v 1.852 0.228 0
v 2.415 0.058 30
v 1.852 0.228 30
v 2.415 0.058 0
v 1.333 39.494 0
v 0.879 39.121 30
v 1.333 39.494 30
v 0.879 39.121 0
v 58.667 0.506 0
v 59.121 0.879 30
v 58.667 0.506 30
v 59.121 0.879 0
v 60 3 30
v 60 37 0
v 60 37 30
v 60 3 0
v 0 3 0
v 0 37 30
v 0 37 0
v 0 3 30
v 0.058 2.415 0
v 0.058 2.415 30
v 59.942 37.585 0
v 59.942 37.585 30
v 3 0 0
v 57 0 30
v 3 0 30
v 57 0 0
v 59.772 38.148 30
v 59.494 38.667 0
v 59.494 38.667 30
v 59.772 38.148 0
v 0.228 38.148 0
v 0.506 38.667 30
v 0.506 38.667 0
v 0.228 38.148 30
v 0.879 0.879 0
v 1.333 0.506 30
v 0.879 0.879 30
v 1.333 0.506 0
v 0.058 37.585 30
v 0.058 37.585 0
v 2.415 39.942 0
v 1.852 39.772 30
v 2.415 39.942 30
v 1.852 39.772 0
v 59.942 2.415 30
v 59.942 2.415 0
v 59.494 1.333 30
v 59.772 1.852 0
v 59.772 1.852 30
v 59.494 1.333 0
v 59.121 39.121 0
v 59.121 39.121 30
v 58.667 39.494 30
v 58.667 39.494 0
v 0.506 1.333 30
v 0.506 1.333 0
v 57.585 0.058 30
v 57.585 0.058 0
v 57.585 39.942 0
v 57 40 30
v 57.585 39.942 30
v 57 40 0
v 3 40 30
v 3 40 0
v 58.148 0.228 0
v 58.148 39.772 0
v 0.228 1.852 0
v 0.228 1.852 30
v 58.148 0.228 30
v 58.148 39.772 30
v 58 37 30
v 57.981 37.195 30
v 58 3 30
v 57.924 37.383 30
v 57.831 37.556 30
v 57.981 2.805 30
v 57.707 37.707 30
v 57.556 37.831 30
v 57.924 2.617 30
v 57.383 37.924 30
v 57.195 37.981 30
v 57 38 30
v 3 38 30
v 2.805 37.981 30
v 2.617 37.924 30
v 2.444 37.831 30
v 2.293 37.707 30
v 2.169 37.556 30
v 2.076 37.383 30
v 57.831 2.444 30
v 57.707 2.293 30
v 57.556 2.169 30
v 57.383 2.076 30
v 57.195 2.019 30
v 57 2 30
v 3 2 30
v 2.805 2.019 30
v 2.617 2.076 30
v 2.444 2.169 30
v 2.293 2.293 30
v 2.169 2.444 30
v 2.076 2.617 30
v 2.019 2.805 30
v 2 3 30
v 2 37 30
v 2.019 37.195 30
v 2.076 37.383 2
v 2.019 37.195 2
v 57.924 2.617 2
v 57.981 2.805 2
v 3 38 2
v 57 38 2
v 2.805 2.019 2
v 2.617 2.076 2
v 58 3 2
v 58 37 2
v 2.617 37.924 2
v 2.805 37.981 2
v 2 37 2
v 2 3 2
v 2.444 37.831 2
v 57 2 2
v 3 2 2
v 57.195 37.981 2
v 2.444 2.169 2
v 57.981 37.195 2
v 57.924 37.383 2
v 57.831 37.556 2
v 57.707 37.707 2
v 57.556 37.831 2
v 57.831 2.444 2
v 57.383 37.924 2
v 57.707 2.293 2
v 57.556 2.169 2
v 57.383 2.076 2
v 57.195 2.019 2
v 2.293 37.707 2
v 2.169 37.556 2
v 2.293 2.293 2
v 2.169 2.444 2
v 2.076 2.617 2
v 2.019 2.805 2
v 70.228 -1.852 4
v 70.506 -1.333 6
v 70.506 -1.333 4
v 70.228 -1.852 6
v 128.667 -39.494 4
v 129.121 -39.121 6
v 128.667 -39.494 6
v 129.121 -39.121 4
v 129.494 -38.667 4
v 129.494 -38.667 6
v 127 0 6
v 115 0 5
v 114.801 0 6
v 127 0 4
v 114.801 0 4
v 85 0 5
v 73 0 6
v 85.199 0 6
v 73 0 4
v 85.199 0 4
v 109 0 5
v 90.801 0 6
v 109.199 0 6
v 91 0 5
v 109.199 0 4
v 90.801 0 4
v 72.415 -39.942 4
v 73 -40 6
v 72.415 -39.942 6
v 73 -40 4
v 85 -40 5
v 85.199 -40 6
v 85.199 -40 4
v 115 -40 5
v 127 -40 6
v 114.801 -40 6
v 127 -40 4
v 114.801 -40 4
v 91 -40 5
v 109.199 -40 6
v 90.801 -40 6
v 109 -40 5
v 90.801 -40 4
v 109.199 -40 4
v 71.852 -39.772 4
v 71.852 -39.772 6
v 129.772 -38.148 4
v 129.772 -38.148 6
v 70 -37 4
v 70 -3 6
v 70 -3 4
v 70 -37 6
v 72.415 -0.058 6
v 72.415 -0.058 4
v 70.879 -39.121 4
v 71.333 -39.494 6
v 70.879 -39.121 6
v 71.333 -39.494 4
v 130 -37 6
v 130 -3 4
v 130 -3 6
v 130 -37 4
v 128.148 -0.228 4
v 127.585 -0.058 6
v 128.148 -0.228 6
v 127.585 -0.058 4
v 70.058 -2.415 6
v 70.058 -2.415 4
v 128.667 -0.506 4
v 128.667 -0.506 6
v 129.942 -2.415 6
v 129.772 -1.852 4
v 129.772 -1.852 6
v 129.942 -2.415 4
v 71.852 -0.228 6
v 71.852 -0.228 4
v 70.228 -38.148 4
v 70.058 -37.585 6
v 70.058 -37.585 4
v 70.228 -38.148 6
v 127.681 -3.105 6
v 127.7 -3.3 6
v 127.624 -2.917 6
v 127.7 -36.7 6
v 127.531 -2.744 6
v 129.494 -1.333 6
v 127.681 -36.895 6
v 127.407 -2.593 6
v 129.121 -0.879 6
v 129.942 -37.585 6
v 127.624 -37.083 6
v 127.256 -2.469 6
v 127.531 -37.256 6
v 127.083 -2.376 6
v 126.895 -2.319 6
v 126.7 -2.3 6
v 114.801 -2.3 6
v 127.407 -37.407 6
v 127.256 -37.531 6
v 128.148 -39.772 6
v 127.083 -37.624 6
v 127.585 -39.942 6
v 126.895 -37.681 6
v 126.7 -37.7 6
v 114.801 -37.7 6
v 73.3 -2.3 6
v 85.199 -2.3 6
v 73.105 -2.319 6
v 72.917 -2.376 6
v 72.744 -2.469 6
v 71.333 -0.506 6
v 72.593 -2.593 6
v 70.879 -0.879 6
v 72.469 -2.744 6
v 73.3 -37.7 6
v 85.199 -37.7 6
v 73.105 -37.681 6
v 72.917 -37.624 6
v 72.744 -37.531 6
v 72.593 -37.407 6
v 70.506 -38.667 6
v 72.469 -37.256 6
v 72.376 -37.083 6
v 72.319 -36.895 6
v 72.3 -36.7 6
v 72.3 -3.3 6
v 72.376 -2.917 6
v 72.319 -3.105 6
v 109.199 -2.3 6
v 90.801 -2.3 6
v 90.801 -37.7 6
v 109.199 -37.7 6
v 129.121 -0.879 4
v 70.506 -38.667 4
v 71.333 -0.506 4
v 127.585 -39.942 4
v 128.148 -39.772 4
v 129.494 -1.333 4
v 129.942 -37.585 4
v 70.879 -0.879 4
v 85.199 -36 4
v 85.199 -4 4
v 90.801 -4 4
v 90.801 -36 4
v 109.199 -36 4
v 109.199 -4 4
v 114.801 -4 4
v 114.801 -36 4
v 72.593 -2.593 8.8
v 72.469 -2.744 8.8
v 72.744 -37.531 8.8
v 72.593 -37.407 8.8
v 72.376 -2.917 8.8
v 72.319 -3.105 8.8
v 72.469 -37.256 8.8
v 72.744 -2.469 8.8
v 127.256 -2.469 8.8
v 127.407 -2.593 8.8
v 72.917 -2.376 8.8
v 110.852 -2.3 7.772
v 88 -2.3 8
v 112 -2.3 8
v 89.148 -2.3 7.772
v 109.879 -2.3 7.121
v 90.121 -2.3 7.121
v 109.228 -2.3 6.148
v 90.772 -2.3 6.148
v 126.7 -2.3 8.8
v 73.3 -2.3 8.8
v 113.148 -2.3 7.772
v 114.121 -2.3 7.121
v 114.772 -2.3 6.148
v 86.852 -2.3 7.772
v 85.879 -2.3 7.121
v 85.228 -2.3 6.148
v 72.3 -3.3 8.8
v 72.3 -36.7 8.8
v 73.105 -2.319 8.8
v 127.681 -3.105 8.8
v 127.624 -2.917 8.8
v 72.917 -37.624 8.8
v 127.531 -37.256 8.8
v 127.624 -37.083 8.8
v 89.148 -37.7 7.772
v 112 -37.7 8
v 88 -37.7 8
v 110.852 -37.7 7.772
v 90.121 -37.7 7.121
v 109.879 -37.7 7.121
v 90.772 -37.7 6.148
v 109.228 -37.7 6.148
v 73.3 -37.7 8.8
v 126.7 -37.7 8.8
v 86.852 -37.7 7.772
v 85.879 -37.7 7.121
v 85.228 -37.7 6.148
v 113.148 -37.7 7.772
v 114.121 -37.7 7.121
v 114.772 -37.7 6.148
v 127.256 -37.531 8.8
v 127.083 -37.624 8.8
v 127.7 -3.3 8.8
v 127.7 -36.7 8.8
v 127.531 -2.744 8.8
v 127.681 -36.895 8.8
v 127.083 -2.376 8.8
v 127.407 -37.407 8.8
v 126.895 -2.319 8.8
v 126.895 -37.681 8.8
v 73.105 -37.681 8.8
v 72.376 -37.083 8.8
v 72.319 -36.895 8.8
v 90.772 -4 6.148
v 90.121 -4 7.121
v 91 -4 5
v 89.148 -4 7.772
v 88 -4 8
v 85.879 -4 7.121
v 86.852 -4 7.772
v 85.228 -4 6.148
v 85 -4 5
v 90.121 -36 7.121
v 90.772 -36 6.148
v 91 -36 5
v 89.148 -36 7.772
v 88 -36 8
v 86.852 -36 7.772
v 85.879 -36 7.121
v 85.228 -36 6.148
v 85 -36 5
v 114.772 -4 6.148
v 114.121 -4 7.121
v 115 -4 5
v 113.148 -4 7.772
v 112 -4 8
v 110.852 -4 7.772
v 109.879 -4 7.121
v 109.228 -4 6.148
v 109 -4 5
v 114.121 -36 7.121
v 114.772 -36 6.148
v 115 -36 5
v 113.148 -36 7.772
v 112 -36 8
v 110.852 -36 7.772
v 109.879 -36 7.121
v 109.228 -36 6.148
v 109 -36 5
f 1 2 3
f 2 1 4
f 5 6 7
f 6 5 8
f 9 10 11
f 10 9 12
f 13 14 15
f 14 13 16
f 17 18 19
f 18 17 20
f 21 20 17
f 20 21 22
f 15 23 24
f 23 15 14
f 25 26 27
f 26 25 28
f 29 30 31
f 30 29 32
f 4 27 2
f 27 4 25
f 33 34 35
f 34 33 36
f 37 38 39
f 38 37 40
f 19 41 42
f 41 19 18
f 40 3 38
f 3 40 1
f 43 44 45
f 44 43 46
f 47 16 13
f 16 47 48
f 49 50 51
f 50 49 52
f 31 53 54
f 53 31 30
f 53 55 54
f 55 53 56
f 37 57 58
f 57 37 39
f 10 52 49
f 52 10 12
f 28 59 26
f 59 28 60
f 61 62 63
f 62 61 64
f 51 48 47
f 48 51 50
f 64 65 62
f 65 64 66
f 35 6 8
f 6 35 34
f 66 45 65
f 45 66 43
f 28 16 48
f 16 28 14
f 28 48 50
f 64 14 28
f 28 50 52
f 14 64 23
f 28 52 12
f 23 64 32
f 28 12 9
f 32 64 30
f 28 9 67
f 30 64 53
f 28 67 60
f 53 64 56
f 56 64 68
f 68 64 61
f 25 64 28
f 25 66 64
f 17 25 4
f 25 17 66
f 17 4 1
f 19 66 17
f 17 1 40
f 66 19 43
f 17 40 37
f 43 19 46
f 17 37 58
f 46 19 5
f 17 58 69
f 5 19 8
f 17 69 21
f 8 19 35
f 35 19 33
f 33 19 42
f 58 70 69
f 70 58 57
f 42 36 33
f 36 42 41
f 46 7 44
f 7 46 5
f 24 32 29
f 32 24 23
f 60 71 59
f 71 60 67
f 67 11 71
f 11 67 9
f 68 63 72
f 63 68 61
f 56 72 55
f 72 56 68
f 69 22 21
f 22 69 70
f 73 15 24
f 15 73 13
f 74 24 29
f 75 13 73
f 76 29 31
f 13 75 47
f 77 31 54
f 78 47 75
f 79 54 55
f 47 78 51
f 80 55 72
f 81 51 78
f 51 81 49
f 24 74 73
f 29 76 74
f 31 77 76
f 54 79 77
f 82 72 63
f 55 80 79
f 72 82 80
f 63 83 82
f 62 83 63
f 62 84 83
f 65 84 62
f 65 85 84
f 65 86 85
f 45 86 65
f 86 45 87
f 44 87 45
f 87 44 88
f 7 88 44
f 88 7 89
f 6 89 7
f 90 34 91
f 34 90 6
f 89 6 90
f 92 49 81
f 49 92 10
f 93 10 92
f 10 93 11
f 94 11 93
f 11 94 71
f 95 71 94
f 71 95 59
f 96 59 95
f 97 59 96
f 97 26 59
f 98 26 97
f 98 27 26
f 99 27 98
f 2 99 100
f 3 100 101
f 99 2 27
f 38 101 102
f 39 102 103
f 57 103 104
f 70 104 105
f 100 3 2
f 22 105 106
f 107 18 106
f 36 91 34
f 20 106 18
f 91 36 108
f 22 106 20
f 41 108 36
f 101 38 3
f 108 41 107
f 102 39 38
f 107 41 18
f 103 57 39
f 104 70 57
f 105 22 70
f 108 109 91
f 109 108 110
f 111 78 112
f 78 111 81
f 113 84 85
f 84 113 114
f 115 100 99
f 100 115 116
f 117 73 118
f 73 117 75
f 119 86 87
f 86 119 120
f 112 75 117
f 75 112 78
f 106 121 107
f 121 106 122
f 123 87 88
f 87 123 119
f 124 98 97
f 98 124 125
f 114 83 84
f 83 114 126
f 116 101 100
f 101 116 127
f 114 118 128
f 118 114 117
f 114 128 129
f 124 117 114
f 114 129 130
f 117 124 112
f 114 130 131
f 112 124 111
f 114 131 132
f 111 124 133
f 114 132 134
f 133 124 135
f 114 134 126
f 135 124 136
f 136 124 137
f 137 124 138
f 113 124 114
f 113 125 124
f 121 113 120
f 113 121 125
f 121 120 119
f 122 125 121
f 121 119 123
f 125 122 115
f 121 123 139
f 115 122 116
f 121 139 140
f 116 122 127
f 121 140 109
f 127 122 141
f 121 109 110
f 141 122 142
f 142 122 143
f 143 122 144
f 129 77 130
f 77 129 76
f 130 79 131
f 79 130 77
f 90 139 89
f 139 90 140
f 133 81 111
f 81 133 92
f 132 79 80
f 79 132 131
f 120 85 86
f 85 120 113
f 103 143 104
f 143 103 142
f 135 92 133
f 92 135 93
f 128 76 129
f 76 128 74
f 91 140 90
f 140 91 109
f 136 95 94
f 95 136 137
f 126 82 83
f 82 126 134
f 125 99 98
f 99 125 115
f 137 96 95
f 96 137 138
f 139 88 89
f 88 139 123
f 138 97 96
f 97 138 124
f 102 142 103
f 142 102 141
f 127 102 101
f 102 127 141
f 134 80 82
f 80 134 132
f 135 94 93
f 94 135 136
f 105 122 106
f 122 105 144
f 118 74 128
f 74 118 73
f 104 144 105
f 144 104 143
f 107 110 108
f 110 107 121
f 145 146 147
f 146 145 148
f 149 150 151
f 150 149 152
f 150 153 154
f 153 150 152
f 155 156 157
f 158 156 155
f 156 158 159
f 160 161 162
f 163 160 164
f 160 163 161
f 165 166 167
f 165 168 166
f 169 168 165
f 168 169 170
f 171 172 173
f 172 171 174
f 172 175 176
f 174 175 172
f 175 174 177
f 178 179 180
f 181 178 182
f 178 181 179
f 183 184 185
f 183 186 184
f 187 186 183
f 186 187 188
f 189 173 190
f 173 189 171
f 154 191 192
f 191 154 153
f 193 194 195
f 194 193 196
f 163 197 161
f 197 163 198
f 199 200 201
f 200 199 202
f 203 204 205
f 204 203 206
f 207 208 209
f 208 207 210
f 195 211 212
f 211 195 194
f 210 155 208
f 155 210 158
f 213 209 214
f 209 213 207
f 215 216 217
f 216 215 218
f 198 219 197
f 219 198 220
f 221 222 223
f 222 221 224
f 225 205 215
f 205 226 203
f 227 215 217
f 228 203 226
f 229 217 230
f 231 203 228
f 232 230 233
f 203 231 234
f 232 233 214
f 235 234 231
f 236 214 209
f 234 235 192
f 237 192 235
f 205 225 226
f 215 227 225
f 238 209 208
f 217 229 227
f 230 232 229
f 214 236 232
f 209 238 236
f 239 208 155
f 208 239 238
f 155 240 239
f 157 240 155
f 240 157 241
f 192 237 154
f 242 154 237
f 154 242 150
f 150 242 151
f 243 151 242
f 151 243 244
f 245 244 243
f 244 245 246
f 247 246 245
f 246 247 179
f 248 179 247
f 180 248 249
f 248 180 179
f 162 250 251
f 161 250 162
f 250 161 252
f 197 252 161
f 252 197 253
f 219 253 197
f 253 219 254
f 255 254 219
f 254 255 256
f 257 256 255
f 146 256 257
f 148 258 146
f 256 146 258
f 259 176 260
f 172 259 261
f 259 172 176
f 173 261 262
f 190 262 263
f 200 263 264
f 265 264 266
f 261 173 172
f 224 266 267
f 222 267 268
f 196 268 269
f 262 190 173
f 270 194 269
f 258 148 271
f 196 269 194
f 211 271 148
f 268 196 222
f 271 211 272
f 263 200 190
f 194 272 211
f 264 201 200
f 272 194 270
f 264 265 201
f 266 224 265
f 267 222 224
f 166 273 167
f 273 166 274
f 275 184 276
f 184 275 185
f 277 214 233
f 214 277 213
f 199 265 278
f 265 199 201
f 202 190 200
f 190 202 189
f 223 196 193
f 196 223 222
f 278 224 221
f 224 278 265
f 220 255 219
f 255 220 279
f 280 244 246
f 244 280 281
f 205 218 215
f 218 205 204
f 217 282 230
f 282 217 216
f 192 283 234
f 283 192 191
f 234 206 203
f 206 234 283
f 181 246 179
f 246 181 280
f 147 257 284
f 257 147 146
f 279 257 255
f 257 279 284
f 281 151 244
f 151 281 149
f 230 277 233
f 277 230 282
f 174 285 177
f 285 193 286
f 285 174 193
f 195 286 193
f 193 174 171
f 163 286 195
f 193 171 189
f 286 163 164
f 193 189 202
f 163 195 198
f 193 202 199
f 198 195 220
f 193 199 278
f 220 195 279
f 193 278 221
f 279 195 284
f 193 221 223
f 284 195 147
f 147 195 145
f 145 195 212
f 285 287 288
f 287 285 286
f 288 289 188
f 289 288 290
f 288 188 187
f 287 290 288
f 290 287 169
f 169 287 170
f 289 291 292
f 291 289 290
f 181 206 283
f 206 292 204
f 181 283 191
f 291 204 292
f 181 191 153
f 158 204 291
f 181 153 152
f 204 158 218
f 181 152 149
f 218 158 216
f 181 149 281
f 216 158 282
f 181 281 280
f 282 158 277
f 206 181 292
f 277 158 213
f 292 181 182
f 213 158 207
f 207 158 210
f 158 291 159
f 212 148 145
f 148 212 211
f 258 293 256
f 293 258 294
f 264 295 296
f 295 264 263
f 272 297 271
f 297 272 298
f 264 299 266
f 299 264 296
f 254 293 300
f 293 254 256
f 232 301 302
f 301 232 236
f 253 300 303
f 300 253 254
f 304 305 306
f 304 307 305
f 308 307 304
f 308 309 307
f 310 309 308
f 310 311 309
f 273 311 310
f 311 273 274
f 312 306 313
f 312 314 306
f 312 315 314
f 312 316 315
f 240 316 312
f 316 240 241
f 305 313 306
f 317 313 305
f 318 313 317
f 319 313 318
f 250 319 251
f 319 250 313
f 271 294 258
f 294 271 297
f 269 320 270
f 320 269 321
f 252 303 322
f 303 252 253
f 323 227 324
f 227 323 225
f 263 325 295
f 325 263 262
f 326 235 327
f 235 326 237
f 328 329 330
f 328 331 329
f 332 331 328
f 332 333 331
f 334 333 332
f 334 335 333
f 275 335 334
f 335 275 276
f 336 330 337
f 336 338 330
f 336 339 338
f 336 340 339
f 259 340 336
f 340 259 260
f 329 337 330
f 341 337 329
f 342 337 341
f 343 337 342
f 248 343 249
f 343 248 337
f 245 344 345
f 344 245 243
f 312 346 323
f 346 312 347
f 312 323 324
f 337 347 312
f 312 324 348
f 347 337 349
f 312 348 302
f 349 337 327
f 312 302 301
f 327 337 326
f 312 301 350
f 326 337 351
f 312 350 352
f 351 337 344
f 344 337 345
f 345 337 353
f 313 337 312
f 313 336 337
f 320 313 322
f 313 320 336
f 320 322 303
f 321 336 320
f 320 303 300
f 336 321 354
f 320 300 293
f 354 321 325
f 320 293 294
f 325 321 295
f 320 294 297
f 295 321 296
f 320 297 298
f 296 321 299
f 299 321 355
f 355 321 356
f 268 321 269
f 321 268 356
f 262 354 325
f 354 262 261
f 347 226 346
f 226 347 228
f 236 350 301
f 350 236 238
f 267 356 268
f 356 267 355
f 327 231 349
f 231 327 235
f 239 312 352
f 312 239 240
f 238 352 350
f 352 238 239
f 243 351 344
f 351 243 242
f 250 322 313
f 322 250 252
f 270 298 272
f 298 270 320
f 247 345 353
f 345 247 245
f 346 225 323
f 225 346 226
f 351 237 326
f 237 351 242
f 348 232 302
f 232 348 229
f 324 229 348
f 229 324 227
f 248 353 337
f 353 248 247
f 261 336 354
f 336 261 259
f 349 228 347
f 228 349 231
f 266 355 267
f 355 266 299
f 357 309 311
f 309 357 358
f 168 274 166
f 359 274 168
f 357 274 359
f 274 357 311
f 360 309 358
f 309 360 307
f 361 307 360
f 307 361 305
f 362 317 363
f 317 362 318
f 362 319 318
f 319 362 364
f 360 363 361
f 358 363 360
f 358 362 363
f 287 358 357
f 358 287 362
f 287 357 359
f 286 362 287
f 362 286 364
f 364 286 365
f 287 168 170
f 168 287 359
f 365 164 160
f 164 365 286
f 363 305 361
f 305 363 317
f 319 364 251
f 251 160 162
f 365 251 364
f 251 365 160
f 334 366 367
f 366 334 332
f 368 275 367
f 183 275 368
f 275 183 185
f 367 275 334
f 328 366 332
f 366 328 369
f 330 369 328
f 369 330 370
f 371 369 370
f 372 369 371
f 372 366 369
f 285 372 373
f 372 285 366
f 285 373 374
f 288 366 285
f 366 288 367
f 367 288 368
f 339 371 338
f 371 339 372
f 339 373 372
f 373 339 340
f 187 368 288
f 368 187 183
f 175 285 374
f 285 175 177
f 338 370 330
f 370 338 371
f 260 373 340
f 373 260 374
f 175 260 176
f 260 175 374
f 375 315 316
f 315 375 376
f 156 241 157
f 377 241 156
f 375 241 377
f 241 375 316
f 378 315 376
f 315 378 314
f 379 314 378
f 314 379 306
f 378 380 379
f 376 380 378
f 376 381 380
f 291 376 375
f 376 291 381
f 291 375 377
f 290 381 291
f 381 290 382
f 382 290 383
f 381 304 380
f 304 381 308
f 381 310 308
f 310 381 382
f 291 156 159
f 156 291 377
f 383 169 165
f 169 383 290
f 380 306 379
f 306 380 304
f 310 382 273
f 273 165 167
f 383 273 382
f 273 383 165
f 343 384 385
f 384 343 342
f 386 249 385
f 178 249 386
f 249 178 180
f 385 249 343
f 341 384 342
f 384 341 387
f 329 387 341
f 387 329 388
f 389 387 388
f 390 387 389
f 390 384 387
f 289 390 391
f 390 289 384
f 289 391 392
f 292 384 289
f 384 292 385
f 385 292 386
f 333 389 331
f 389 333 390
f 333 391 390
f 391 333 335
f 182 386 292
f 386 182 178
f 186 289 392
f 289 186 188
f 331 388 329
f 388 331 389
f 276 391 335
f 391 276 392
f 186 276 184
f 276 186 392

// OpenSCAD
// Parametric Box with Lid
// A customizable storage box for 3D printing

// === Box Parameters ===
width = 60;              // [20:200] Width in mm
depth = 40;              // [20:200] Depth in mm
height = 30;             // [10:150] Height in mm
wall_thickness = 2;      // [1:0.5:5] Wall thickness in mm

// === Lid Parameters ===
include_lid = true;      // Include a separate lid
lid_height = 8;          // [5:30] Lid height in mm
lid_tolerance = 0.3;     // [0.1:0.1:0.8] Gap for lid fit

// === Style Options ===
corner_radius = 3;       // [0:10] Corner rounding radius
add_grip = true;         // Add grip indents to lid

// === Internal ===
$fn = 32;                // Smoothness

// Rounded box module
module rounded_box(w, d, h, r) {
    if (r > 0) {
        hull() {
            for (x = [r, w-r]) {
                for (y = [r, d-r]) {
                    translate([x, y, 0])
                        cylinder(h = h, r = r);
                }
            }
        }
    } else {
        cube([w, d, h]);
    }
}

// Main box body
module box_body() {
    difference() {
        rounded_box(width, depth, height, corner_radius);
        
        // Hollow inside
        translate([wall_thickness, wall_thickness, wall_thickness])
            rounded_box(
                width - 2*wall_thickness,
                depth - 2*wall_thickness,
                height,  // Open top
                max(0, corner_radius - wall_thickness)
            );
    }
}

// Lid
module lid() {
    inner_w = width - 2*wall_thickness - 2*lid_tolerance;
    inner_d = depth - 2*wall_thickness - 2*lid_tolerance;
    lip_height = lid_height * 0.6;
    
    difference() {
        union() {
            // Top cap
            rounded_box(width, depth, wall_thickness, corner_radius);
            
            // Inner lip
            translate([wall_thickness + lid_tolerance, wall_thickness + lid_tolerance, -lip_height + wall_thickness])
                rounded_box(inner_w, inner_d, lip_height, max(0, corner_radius - wall_thickness));
        }
        
        // Grip indents
        if (add_grip) {
            for (x = [width * 0.3, width * 0.7]) {
                translate([x, -1, wall_thickness/2])
                    rotate([-90, 0, 0])
                    cylinder(h = 5, r = 3, $fn = 16);
                translate([x, depth - 4, wall_thickness/2])
                    rotate([-90, 0, 0])
                    cylinder(h = 5, r = 3, $fn = 16);
            }
        }
    }
}

// Render
box_body();

if (include_lid) {
    // Position lid next to box for printing
    translate([width + 10, 0, lid_height - wall_thickness])
        rotate([180, 0, 0])
        lid();
}
